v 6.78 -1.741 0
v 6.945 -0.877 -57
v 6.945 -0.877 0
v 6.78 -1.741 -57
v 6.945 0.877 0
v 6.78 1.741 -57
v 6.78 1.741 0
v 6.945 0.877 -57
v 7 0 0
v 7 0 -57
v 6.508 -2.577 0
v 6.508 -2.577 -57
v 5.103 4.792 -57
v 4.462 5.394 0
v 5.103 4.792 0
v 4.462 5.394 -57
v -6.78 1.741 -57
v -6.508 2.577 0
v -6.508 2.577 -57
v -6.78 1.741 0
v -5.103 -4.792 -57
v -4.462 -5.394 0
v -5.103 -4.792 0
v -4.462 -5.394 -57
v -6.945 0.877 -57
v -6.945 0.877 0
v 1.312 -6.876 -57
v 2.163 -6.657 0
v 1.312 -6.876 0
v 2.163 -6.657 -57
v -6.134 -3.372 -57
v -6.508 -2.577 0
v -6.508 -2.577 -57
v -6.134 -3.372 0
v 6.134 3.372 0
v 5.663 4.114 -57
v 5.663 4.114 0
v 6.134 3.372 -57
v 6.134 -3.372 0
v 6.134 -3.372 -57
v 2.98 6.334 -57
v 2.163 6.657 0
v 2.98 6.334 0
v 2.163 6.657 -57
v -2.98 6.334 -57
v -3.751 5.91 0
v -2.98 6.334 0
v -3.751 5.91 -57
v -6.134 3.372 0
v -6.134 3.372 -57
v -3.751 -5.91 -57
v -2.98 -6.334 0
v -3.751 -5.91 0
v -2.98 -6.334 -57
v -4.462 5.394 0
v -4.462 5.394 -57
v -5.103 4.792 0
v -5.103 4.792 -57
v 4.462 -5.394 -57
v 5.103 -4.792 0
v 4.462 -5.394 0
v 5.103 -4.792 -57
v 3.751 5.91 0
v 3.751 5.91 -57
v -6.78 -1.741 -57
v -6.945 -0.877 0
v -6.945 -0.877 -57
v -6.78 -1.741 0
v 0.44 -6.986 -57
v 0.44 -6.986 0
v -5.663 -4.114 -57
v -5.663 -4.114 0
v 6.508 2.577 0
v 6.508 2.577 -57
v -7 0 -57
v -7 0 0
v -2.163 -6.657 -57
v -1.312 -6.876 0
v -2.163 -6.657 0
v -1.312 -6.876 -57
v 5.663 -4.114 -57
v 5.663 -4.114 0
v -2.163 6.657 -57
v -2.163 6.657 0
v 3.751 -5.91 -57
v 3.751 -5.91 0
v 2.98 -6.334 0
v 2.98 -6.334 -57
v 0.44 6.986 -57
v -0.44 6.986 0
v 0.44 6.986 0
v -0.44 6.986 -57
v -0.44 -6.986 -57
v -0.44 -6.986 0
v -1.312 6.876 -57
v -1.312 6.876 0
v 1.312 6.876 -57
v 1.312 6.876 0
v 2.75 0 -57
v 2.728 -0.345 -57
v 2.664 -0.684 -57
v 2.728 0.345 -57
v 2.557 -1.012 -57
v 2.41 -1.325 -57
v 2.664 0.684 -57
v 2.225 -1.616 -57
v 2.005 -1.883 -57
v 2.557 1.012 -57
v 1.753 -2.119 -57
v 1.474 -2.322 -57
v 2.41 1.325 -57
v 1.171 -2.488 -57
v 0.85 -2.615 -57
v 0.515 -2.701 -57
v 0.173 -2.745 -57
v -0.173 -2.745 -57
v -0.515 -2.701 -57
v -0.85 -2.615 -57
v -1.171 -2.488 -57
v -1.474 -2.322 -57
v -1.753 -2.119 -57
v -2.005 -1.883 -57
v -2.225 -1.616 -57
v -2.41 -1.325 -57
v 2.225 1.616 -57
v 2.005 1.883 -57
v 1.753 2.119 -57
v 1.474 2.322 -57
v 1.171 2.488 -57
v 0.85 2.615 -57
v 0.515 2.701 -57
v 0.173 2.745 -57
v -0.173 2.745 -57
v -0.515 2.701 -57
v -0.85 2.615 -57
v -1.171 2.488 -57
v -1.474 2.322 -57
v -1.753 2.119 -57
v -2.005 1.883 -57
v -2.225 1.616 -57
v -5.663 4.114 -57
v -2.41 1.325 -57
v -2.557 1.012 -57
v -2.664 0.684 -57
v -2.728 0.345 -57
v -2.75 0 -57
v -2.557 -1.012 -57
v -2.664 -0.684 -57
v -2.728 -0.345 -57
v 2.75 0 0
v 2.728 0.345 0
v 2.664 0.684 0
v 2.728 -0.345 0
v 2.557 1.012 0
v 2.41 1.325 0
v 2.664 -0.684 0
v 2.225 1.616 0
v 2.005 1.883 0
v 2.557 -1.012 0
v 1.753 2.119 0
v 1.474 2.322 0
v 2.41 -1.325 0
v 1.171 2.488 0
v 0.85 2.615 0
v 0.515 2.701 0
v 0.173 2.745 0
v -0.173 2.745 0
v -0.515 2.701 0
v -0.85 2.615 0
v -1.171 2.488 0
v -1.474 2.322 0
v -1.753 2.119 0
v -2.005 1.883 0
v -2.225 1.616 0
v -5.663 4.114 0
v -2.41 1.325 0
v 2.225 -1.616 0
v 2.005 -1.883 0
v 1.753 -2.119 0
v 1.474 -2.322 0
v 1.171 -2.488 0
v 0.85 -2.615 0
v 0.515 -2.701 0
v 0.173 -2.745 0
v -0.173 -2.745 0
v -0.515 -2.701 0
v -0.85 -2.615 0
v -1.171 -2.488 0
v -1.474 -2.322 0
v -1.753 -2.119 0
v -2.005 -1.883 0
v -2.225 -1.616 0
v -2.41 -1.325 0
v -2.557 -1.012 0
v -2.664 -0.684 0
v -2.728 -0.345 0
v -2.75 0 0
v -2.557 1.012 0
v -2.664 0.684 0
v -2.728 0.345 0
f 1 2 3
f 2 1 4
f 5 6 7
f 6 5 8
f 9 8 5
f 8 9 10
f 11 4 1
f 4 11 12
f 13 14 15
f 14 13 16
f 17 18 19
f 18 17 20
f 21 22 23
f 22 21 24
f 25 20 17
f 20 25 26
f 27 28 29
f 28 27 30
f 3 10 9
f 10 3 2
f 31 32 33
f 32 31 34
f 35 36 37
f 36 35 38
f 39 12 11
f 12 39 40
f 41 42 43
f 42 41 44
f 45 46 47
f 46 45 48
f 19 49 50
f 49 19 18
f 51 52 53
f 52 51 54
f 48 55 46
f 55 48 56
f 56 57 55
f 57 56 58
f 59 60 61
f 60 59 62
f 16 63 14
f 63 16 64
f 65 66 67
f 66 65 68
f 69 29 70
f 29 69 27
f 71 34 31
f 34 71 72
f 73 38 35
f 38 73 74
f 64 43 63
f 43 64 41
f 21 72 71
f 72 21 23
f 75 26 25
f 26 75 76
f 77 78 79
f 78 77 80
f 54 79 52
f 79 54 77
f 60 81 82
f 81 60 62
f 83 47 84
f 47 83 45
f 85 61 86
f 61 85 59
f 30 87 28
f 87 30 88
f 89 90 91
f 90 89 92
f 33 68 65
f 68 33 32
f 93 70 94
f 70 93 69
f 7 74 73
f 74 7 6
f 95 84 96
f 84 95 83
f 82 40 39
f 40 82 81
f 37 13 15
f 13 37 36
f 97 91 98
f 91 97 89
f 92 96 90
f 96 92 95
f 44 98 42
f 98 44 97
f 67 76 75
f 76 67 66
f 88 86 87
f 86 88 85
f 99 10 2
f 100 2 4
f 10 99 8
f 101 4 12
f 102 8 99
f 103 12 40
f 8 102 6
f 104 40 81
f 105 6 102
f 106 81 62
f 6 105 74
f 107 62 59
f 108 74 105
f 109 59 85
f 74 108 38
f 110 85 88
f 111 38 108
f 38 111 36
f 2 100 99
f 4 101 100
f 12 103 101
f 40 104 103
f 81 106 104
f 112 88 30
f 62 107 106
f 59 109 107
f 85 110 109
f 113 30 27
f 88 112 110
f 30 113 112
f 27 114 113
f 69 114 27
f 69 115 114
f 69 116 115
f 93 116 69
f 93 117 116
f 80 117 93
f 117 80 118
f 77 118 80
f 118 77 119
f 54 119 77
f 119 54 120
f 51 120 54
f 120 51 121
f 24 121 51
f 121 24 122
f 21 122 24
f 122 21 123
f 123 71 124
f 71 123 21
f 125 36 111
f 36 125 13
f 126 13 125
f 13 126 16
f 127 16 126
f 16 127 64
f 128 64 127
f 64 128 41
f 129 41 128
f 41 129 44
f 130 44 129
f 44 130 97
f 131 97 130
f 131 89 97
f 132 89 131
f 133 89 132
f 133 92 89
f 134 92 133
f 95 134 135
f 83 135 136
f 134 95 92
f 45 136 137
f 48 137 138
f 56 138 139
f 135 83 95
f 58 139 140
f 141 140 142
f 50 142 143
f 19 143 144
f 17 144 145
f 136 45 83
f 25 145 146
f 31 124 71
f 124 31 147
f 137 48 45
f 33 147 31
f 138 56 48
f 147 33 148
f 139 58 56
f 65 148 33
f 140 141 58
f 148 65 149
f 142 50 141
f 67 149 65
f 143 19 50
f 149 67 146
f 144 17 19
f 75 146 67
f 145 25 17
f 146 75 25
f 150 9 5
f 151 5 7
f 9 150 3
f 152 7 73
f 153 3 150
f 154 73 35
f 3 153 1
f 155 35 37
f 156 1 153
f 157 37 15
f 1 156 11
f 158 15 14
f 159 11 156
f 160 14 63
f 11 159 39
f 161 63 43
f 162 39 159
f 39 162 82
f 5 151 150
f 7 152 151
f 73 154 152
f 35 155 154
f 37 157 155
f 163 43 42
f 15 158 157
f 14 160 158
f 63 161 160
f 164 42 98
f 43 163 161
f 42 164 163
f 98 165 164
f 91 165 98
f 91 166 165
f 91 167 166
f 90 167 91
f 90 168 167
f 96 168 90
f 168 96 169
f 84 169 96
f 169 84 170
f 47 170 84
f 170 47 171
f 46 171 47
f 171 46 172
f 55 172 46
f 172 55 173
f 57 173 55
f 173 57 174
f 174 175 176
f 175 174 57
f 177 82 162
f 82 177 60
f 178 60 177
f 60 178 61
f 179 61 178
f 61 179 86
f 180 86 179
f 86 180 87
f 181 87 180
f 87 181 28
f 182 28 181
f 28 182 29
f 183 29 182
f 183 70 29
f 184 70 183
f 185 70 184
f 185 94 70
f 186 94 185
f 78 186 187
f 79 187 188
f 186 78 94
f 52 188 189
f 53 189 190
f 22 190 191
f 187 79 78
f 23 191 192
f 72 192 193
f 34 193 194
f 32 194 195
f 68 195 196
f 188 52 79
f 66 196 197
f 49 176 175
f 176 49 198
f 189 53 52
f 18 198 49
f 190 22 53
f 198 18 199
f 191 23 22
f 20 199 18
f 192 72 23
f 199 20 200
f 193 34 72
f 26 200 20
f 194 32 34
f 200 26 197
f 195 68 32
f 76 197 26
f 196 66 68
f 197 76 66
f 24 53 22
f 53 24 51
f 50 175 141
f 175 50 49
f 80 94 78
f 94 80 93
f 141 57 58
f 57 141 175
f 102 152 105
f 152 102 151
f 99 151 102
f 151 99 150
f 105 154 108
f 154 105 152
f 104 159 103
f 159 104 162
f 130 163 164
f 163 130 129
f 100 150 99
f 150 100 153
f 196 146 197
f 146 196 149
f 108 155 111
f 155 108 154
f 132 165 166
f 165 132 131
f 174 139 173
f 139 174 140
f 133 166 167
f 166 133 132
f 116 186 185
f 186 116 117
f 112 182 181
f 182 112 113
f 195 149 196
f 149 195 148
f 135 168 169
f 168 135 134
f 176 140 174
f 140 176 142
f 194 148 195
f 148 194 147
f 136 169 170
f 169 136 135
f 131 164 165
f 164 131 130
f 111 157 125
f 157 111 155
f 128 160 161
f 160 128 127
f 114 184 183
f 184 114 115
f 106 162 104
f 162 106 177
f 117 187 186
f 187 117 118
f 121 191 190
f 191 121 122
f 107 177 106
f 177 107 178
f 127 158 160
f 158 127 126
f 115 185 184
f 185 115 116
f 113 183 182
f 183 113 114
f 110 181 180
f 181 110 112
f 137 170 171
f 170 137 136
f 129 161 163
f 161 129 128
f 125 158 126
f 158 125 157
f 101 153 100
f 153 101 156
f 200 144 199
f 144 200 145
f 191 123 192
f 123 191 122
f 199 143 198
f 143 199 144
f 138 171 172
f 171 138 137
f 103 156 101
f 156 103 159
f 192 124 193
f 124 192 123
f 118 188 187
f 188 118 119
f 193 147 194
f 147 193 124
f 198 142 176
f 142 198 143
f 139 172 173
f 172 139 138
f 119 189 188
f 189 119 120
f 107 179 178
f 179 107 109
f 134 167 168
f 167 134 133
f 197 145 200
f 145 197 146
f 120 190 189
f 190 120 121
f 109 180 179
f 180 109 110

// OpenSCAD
$fn = 50;


difference() {
	union() {
		translate(v = [0, 0, -57.0000000000]) {
			cylinder(h = 57, r = 7.0000000000);
		}
		cylinder(h = 0, r = 16.0000000000);
	}
	union() {
		#translate(v = [0, 0, -57]) {
			cylinder(h = 57, r = 2.7500000000);
		}
	}
}
